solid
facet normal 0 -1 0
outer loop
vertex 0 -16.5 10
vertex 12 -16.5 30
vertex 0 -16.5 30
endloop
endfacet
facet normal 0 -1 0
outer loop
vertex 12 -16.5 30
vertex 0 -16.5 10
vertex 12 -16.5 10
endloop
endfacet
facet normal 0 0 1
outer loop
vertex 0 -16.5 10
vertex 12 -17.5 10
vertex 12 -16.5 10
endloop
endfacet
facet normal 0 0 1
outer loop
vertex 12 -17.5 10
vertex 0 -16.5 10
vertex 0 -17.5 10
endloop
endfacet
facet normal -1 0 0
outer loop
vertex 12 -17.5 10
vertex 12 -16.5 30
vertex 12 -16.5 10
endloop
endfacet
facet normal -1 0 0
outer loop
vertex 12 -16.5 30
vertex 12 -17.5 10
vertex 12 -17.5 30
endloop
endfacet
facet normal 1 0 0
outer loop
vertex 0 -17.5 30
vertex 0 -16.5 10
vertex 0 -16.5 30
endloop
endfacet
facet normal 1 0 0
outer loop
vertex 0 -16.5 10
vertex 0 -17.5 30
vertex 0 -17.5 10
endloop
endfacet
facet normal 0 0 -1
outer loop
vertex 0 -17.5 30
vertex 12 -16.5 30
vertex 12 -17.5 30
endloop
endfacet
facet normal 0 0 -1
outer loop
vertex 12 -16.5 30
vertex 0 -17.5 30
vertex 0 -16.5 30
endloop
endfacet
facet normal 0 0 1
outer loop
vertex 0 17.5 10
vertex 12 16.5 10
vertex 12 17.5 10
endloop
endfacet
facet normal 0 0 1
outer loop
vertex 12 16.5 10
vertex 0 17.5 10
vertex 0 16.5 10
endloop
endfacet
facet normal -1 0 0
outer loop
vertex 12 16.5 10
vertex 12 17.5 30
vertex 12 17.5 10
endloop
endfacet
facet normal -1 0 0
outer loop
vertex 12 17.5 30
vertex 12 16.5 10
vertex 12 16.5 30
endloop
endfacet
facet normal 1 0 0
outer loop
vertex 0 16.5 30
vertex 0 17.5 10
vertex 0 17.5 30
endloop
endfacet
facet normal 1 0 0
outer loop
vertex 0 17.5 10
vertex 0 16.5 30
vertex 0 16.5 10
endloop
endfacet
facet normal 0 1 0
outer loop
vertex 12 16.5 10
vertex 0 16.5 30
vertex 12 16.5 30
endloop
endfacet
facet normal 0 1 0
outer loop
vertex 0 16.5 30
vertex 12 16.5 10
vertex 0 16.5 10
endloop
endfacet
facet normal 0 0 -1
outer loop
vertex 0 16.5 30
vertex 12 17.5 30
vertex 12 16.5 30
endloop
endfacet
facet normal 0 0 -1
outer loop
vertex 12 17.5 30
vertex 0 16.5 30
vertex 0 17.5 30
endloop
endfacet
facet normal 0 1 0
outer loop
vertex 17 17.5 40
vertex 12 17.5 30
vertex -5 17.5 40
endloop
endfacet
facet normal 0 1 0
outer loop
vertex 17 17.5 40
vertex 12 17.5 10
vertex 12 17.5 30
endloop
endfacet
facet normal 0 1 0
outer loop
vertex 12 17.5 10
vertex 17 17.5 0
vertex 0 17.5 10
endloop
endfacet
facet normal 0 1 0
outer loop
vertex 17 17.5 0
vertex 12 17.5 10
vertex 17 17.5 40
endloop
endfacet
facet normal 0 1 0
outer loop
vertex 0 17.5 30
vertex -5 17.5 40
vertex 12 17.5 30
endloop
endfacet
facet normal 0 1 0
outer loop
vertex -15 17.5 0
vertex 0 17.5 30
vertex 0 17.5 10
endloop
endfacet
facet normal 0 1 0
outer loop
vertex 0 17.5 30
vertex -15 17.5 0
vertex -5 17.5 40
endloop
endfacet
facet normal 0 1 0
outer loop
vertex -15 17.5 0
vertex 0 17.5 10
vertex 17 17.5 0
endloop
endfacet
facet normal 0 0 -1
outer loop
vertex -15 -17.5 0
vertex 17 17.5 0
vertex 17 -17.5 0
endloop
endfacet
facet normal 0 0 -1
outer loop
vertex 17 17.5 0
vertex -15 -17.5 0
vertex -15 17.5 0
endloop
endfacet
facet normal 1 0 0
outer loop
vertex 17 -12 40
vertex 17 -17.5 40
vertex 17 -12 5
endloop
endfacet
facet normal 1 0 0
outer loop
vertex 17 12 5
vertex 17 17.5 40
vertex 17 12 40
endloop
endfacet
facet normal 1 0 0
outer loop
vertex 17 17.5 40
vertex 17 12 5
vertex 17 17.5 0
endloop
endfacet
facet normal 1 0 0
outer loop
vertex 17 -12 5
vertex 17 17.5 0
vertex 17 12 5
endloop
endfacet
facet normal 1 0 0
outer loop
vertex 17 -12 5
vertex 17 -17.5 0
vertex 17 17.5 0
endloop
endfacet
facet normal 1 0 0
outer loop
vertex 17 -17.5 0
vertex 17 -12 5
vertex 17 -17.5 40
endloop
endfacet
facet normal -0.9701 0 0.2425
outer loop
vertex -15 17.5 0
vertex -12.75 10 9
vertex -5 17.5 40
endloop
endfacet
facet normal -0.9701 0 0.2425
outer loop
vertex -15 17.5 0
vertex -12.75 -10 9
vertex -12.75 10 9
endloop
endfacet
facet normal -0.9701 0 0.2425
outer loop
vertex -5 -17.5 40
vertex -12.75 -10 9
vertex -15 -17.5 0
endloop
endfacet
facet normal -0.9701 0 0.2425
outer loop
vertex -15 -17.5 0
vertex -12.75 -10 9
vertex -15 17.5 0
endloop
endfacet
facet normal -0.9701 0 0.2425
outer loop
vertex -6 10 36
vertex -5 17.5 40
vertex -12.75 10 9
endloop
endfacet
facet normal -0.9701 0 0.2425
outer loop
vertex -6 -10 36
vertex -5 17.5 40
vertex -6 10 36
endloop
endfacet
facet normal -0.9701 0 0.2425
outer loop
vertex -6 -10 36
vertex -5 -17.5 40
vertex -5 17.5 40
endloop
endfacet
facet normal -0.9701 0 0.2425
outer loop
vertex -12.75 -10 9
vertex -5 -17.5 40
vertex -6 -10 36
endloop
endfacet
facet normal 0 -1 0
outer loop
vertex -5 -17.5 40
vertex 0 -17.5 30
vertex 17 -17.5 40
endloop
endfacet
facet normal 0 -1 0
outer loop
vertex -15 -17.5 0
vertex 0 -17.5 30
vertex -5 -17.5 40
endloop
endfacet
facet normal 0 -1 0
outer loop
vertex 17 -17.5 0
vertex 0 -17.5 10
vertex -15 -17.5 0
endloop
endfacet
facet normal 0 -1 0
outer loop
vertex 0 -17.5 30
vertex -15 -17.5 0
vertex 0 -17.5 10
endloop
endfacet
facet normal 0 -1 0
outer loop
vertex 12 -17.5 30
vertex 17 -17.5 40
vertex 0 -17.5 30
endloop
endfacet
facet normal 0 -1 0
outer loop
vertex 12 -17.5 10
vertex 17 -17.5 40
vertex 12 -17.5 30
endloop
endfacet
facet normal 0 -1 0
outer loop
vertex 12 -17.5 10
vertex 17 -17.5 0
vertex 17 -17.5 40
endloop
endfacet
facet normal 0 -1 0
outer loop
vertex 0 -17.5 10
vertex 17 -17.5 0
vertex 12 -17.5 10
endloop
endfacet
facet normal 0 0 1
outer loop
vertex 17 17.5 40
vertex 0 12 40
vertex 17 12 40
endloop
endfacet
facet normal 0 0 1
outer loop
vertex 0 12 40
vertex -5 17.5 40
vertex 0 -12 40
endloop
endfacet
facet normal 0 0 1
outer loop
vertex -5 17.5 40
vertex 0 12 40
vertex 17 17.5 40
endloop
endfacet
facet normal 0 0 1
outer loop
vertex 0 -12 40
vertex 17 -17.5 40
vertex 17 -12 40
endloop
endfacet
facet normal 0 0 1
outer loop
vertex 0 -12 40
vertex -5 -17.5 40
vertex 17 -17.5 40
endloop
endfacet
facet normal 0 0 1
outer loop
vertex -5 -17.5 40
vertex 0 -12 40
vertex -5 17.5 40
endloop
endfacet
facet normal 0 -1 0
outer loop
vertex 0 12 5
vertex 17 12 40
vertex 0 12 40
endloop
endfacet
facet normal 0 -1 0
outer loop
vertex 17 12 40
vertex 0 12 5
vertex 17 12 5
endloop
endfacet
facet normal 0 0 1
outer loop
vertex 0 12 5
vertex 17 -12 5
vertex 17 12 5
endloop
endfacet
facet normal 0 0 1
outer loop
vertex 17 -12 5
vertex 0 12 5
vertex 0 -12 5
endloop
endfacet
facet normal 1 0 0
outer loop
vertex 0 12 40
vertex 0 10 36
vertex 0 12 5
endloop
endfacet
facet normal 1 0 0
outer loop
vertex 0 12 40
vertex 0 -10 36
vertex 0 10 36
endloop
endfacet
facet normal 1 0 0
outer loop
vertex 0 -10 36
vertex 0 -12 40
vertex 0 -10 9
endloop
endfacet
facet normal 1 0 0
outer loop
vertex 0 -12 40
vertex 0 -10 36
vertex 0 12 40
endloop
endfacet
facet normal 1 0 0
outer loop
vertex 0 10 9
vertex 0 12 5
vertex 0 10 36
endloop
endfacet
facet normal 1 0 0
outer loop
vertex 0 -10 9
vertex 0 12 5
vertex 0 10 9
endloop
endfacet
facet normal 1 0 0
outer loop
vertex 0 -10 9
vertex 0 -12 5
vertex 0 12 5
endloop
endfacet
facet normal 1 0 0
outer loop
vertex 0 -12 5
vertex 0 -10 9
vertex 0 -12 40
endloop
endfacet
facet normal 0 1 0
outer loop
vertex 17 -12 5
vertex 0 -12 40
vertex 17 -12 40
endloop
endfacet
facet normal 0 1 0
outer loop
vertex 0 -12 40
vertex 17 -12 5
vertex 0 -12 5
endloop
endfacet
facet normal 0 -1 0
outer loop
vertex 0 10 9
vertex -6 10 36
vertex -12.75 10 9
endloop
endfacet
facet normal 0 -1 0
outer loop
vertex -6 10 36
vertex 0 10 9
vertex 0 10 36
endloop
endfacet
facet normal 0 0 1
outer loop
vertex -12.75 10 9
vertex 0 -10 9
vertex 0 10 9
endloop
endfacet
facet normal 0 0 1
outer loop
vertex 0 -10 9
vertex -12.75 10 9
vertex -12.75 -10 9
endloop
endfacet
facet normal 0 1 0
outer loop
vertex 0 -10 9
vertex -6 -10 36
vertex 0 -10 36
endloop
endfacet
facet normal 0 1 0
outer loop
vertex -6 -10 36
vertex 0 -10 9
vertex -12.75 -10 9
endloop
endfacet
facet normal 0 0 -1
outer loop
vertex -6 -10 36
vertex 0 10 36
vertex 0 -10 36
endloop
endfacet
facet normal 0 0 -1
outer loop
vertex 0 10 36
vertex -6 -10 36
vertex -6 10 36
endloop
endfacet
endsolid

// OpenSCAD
// file: ../OpenSCAD_Modules/cube_vround.scad
module cube_vround(
	size=[10,10,10],
	round_corners=[true,true,true,true],
	rounding=3,
	center_xy=false,
	center_z=false,
	attach=0,
	wall_attach=0,
	quality=2, //integer from 1 to infinity
)
{
	assert(len(size)==3);
	assert(len(round_corners)==4);
	assert(rounding>0);
	assert(rounding<=size[0]/2);
	assert(rounding<=size[1]/2);
	assert(quality>0);
	assert(attach>=0);
	assert(wall_attach>=0);
	height=size[2]+attach;
	cyl_r=rounding+wall_attach;
	cyl_mvx=size[0]/2-rounding;
	cyl_mvy=size[1]/2-rounding;
	cube_szx=size[0]/2;
	cube_szy=size[1]/2;
	cube_mvx=cube_szx/2+wall_attach;
	cube_mvy=cube_szy/2+wall_attach;
	translate([center_xy?0:cube_szx,center_xy?0:cube_szy,center_z?-attach/2:(size[2]-attach)/2])
		hull()
		{
			if(round_corners[0])
				translate([cyl_mvx,cyl_mvy])
					cylinder(r=cyl_r,h=height,$fn=12*quality,center=true);
			else
				translate([cube_mvx,cube_mvy])
					cube([cube_szx,cube_szy,height],center=true);
			if(round_corners[1])
				translate([cyl_mvx,-cyl_mvy])
					cylinder(r=cyl_r,h=height,$fn=12*quality,center=true);
			else
				translate([cube_mvx,-cube_mvy])
					cube([cube_szx,cube_szy,height],center=true);
			if(round_corners[2])
				translate([-cyl_mvx,-cyl_mvy])
					cylinder(r=cyl_r,h=height,$fn=12*quality,center=true);
			else
				translate([-cube_mvx,-cube_mvy])
					cube([cube_szx,cube_szy,height],center=true);
			if(round_corners[3])
				translate([-cyl_mvx,cyl_mvy])
					cylinder(r=cyl_r,h=height,$fn=12*quality,center=true);
			else
				translate([-cube_mvx,cube_mvy])
					cube([cube_szx,cube_szy,height],center=true);
		};
}

//example
cube_vround(round_corners=[true,false,true,false],
size=[10,20,6],
attach=0.1,
wall_attach=0.1,
rounding=3,
center_xy=true,center_z=false);
// main file
use <../OpenSCAD_Modules/cube_vround.scad>

//back
height=40;
width1=15;
width2=5;
length=35;

//front
fheight=30;
fwidth1=17;
flength=24;
fh_down=(height-fheight)/2;

//front cut
fcheight=20;
fcwidth=12;
fcdepth=2;
fch_down=(height-fcheight)/2;
fch_up=height-fch_down;

//rear_cut
rcheight=27;
rclength=20;
rc_down=(height-rcheight)/2;
rc_up=height-rc_down;
rc_shift=fh_down;


cut_clr=1;

difference()
{

translate([0,length/2, 0])
rotate(a=90,v=[1,0,0])
linear_extrude(height=length)
polygon(points=[
	[0,0],
	[-width1,0],
	[-width2,height],
	[fwidth1,height],
	[fwidth1,0],
]);

translate([0,flength/2, 0])
rotate(a=90,v=[1,0,0])
linear_extrude(height=flength)
polygon(points=[
	[0,fh_down],
	[0,height+cut_clr],
	[fwidth1+cut_clr,height+cut_clr],
	[fwidth1+cut_clr,fh_down],
]);

for(i=[-1:2:1])
translate([0,i*(length+cut_clr)/2, 0])
translate([0,(fcdepth+cut_clr)/2, 0])
rotate(a=90,v=[1,0,0])
linear_extrude(height=fcdepth+cut_clr)
polygon(points=[
	[0,fch_down],
	[0,fch_up],
	[fcwidth,fch_up],
	[fcwidth,fch_down],
]);

translate([0,(rclength)/2, rc_shift/2])
rotate(a=90,v=[1,0,0])
linear_extrude(height=rclength)
polygon(points=[
	[cut_clr,rc_down],
	[cut_clr,rc_up],
	[-width1-cut_clr,rc_up],
	[-width1-cut_clr,rc_down],
]);


}
